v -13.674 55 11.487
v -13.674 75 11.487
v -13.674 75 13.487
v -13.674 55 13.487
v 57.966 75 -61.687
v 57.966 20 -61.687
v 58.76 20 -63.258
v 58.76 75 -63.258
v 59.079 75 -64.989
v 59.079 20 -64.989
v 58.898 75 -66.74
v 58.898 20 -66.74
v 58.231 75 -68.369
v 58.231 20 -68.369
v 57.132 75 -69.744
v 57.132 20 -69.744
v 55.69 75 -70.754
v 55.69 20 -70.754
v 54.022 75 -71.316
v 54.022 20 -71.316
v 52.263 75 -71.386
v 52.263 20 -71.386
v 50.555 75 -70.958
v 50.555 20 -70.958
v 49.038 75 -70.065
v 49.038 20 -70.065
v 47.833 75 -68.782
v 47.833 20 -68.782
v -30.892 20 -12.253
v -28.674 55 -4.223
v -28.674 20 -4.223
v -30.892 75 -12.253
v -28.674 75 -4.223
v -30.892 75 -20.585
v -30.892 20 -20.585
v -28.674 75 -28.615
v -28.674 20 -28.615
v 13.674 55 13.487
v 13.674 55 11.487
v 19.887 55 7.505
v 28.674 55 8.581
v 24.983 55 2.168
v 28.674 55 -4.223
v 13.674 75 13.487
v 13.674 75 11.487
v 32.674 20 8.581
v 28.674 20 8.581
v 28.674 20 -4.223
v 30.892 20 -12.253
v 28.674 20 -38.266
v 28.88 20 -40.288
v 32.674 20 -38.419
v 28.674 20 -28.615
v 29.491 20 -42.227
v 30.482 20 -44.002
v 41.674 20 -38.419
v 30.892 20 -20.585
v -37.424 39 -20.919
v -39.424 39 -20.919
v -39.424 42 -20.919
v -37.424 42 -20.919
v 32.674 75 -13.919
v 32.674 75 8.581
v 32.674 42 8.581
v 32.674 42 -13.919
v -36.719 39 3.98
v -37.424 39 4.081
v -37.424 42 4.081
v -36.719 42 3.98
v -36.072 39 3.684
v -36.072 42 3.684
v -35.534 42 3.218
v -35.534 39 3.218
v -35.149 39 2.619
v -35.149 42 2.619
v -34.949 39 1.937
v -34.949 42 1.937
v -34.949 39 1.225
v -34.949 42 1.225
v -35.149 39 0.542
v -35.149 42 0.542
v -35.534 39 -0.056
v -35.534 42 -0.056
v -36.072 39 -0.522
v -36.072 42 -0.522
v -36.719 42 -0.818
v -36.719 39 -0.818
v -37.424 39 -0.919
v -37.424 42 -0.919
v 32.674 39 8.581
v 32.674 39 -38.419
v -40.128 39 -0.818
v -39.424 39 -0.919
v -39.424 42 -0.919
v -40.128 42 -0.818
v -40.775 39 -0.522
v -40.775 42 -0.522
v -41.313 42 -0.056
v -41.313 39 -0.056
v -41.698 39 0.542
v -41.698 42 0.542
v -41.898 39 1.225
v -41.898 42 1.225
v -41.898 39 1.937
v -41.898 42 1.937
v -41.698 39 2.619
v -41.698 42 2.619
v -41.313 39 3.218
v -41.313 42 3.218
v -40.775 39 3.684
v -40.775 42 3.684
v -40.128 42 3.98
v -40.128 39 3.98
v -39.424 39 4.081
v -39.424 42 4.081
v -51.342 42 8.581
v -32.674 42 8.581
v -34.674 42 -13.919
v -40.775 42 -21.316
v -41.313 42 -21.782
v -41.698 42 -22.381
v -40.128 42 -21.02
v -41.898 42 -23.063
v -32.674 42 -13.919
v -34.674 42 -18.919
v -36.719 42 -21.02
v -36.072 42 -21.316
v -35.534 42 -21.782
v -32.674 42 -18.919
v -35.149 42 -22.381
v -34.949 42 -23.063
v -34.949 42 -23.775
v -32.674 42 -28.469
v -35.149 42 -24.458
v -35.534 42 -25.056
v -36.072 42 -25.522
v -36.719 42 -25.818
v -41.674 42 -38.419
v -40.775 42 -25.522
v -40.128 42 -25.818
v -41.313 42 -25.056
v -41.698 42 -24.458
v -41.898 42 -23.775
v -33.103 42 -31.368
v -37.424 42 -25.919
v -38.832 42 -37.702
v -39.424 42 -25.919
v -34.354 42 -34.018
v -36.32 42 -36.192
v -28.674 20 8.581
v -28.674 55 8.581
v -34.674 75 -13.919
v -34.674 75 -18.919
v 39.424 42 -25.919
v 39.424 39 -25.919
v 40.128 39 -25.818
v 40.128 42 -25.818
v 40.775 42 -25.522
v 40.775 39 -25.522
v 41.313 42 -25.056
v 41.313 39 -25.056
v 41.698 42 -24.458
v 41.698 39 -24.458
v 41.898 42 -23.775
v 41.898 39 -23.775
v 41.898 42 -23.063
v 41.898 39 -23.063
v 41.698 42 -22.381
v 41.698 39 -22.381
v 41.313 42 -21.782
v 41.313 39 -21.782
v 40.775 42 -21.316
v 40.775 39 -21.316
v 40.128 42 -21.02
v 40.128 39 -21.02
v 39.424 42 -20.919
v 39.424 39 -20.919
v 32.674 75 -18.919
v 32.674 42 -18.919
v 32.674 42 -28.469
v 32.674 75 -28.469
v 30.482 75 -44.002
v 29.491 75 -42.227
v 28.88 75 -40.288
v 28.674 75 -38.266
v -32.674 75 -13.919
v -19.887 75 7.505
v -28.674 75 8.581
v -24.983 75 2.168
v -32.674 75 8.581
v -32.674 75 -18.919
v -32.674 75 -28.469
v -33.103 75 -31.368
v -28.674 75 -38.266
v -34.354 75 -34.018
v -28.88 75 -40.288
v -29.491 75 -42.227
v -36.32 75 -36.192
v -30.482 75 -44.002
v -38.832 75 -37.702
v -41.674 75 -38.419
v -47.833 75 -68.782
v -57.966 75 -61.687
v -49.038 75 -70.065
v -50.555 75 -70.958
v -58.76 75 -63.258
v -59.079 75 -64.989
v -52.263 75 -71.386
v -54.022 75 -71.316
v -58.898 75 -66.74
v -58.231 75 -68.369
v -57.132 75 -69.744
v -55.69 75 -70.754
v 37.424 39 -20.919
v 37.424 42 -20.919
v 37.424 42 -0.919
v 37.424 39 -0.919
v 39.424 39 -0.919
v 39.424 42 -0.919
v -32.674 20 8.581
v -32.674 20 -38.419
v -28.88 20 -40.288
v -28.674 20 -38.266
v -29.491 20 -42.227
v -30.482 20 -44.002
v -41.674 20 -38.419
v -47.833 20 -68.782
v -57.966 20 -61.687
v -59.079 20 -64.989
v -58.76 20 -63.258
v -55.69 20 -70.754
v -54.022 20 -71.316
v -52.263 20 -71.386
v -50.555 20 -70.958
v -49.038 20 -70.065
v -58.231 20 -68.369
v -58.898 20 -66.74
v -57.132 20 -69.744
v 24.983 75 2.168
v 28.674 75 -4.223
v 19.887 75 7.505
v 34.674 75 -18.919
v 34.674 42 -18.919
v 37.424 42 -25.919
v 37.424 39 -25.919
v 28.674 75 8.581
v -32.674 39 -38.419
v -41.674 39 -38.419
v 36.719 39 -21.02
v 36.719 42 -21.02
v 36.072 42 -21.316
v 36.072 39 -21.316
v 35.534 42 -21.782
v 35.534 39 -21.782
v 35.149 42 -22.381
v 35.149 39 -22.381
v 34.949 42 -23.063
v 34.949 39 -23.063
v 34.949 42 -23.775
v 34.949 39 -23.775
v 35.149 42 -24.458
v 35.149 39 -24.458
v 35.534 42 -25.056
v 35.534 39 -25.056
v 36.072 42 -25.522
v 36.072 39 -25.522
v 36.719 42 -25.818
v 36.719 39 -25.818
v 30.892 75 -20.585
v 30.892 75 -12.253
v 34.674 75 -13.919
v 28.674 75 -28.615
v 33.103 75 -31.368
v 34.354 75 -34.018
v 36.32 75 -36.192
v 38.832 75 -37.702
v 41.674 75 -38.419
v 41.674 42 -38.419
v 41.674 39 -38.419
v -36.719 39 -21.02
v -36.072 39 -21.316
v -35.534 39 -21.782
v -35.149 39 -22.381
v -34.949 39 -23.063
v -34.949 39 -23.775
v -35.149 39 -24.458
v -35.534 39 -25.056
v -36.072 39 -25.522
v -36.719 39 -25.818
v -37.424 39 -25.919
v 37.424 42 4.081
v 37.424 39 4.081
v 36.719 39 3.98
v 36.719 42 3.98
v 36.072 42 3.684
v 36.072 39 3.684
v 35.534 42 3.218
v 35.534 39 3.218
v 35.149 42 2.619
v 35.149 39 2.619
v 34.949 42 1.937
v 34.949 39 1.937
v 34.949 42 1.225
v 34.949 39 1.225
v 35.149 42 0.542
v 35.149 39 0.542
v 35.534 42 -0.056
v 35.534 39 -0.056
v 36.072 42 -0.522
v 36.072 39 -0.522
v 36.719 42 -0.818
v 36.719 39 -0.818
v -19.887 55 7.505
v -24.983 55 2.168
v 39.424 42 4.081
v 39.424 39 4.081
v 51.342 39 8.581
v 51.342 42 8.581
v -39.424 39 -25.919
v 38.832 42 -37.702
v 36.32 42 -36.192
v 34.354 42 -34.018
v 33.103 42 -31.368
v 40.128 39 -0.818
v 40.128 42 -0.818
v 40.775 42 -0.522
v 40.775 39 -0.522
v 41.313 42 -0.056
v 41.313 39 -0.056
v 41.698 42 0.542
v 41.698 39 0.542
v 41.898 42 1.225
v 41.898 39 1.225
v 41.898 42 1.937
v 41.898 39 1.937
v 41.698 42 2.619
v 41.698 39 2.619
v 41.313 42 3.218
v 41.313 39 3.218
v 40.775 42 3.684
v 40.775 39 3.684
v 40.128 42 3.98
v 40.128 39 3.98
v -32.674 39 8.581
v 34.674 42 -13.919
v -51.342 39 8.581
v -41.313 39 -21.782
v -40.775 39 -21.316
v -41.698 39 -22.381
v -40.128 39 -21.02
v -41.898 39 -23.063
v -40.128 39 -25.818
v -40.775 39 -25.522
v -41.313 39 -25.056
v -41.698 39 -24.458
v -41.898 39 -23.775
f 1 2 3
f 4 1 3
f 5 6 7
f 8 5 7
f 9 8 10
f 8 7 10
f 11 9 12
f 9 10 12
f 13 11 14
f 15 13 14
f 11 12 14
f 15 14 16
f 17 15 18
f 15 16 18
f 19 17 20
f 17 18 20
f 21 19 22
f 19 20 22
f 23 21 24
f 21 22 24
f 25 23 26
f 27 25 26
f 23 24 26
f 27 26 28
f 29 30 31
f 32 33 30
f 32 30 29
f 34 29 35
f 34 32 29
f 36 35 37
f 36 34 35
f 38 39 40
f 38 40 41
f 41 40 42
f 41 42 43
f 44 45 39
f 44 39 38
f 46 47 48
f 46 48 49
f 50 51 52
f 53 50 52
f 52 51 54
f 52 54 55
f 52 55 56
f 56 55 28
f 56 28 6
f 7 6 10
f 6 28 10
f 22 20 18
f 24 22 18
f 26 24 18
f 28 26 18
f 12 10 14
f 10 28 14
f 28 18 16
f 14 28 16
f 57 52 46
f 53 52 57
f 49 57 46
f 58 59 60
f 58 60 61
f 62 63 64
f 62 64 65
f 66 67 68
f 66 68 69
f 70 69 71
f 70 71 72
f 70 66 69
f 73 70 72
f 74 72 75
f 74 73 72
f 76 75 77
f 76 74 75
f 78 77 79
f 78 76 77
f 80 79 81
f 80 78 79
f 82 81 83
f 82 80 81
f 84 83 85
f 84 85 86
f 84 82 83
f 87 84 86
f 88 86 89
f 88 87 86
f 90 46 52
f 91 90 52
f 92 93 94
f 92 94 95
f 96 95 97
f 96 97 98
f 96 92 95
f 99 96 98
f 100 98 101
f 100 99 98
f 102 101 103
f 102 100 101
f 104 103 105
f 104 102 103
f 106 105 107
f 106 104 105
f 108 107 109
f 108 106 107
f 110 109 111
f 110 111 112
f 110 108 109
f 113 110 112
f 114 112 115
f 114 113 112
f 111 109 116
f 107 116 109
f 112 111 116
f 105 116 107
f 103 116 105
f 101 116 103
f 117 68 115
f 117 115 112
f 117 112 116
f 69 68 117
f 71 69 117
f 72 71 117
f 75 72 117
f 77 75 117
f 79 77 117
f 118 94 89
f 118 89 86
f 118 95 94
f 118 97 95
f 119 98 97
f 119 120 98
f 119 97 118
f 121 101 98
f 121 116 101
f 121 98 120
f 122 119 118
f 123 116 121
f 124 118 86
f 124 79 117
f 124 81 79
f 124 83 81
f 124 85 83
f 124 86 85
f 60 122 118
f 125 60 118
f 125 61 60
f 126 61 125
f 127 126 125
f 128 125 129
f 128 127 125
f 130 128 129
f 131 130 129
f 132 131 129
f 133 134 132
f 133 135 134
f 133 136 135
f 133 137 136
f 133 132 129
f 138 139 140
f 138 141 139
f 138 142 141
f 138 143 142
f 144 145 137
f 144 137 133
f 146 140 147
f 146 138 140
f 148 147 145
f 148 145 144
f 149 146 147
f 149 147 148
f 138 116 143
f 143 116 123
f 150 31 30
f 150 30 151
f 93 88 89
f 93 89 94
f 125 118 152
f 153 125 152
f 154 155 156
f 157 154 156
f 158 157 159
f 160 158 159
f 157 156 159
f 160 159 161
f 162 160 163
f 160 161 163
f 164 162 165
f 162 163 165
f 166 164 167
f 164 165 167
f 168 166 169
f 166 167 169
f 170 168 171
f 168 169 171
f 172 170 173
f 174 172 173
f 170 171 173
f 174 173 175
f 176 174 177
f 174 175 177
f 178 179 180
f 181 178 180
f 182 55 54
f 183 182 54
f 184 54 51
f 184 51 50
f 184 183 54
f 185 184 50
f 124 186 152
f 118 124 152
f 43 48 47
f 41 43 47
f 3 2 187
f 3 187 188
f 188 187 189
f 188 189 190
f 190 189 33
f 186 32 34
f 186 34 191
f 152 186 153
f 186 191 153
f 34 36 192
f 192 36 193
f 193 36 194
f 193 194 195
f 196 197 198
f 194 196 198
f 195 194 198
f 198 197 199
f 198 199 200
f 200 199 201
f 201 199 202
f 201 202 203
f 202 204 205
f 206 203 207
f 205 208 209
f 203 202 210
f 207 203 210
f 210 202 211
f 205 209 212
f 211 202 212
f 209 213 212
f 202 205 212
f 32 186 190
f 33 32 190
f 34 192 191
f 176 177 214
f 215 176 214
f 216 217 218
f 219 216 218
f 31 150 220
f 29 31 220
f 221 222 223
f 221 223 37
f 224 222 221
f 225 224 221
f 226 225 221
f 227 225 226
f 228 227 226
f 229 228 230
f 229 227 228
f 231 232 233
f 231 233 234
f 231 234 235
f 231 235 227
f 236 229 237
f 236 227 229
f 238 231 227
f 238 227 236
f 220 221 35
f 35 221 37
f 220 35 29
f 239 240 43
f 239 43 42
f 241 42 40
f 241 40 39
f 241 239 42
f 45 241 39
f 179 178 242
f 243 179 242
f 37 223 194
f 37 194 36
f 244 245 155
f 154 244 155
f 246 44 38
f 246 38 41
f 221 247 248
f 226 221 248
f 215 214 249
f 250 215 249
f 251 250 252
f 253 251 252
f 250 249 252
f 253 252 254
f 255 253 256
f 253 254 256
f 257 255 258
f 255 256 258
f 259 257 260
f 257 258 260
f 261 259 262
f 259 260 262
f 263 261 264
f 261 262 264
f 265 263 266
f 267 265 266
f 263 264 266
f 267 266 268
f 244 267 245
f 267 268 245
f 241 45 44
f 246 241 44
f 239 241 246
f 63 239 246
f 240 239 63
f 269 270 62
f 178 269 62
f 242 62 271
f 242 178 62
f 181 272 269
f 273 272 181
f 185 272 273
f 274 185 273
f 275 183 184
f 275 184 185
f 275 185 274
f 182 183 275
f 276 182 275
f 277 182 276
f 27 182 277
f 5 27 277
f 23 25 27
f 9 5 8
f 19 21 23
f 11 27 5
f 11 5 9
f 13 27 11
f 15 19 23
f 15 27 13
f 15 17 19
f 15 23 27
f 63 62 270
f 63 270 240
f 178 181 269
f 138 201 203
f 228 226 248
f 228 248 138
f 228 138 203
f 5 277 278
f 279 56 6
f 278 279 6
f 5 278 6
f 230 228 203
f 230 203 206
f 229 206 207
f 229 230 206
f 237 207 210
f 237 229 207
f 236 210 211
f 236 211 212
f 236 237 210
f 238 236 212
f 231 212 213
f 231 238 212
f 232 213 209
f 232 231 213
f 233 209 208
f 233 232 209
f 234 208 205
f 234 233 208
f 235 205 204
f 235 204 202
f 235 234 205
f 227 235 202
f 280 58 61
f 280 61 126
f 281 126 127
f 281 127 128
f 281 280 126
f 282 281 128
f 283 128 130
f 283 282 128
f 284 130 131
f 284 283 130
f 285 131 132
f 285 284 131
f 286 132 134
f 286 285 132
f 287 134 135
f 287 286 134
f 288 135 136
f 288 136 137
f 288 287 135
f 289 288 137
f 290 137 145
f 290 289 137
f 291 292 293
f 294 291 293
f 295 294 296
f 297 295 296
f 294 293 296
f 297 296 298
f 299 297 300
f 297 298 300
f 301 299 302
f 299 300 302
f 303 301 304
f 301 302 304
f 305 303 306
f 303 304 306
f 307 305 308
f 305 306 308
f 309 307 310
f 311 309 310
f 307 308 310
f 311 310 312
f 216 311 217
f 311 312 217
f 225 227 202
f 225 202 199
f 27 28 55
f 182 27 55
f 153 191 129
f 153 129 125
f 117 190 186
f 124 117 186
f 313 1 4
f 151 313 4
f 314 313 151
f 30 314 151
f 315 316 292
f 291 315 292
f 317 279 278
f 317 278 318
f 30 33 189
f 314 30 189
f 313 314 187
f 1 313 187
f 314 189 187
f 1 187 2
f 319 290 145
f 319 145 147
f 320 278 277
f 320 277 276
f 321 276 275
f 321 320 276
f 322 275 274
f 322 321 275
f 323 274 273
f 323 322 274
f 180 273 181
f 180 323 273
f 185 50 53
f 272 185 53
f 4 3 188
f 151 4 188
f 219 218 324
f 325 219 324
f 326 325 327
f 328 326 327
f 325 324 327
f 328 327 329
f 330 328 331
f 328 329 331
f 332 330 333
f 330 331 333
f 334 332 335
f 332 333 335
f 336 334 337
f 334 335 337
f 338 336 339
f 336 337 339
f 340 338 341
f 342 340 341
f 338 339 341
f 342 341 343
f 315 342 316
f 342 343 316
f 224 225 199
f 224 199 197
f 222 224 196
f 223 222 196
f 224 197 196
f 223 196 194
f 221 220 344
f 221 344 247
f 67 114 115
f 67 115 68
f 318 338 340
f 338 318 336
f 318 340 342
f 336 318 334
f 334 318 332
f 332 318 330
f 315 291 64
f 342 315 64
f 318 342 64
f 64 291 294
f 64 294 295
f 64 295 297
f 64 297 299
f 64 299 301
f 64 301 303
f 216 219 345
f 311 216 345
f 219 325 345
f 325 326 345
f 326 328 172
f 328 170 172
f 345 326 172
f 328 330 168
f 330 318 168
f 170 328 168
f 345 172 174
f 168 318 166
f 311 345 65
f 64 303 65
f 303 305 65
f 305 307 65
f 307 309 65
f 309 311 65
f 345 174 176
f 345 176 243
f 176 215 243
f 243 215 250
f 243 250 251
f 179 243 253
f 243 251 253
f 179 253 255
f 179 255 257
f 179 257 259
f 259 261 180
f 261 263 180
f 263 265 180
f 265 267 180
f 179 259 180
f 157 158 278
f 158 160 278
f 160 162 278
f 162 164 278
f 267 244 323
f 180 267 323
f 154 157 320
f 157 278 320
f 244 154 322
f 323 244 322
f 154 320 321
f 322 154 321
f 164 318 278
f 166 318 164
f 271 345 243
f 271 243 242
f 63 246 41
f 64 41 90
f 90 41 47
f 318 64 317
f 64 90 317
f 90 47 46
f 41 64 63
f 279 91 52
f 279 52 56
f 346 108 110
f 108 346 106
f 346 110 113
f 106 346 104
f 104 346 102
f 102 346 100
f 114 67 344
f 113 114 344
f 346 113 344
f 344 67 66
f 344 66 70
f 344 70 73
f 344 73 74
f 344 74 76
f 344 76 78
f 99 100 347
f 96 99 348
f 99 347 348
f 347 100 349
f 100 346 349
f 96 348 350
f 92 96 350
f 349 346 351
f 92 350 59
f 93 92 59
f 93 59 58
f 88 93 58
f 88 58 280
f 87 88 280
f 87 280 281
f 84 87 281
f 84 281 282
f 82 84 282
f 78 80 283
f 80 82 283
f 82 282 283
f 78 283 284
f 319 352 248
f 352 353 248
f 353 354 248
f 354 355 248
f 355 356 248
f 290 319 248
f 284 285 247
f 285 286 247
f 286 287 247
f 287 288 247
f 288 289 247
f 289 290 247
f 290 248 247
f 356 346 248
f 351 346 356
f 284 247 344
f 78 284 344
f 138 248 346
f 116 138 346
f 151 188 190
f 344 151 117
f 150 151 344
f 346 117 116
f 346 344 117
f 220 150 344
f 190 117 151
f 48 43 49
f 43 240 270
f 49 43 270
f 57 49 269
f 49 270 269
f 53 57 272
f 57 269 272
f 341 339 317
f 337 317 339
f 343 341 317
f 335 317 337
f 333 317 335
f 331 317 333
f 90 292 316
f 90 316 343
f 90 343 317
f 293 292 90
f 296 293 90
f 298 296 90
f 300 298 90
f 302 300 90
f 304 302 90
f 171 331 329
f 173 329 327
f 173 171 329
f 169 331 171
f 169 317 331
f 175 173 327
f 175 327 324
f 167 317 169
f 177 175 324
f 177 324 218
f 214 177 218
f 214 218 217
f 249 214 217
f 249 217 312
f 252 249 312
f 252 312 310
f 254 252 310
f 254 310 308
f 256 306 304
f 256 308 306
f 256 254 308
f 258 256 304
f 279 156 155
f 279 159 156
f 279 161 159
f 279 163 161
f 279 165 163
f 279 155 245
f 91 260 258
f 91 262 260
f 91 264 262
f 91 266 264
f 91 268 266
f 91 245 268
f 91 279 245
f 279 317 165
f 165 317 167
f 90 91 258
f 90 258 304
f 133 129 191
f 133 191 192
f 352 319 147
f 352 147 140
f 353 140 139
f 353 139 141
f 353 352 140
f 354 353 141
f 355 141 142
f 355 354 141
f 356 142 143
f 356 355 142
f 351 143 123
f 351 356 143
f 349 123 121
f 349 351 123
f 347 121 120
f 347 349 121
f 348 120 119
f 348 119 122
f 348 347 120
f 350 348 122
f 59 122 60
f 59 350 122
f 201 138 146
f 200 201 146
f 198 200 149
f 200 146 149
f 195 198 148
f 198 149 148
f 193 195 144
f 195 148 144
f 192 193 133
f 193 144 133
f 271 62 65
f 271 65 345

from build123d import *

# Parameters (mm, degrees)
BOSS_EXTRU_1_DEPTH      = 55
CONG_1_R                = 10
ESQUISSE2_R             = 31
ENL_V_MAT_EXTRU_1_DEPTH = 108.780485936
BOSS_EXTRU_2_DEPTH      = 3
ESQUISSE4_W             = 2
ESQUISSE4_H             = 33
BOSS_EXTRU_3_DEPTH      = 2.5
CONG_2_R                = 10
BOSS_EXTRU_4_DEPTH      = 20


with BuildPart() as part:
    # Esquisse1 → Boss.-Extru.1 (new body)
    with BuildSketch(Plane(origin=(0, 20, 0), x_dir=(1, 0, 0), z_dir=(0, 1, 0))):
        with BuildLine():
            Line((32.673562069, -8.580941108), (32.673562069, 38.419058892))
            Line((32.673562069, 38.419058892), (41.673562069, 38.419058892))
            Line((41.673562069, 38.419058892), (57.965753801, 61.686720039))
            ThreePointArc((57.965753801, 61.686720039), (56.44690478, 70.300540881), (47.833083938, 68.781691859))
            Line((47.833083938, 68.781691859), (28.673562069, 41.419058892))
            Line((28.673562069, 41.419058892), (28.673562069, -8.580941108))
            Line((28.673562069, -8.580941108), (32.673562069, -8.580941108))
        make_face()
    extrude(amount=BOSS_EXTRU_1_DEPTH)

    # Congé1
    cong_1_edges = [part.edges().sort_by_distance(p)[0] for p in [
        (28.673562069, 47.5, -41.419058892),
    ]]
    fillet(cong_1_edges, radius=CONG_1_R)

    # Esquisse2 → Enlèv. mat.-Extru.1 (cut, through all)
    with BuildSketch(Plane(origin=(0, 75, 0), x_dir=(1, 0, 0), z_dir=(0, 1, 0))):
        with Locations((0.173562069, 16.419058892)):
            Circle(ESQUISSE2_R)
    extrude(amount=-ENL_V_MAT_EXTRU_1_DEPTH, mode=Mode.SUBTRACT)

    # Esquisse3 → Boss.-Extru.2 (add)
    with BuildSketch(Plane(origin=(0, 39, 0), x_dir=(1, 0, 0), z_dir=(0, 1, 0))):
        Polygon((32.673562069, -8.580941108), (32.673562069, 38.419058892), (41.673562069, 38.419058892), (51.341622453, -8.580941108), align=None)
        with BuildLine():
            Line((37.423562069, 25.919058892), (39.423562069, 25.919058892))
            ThreePointArc((39.423562069, 25.919058892), (41.923562069, 23.419058892), (39.423562069, 20.919058892))
            Line((39.423562069, 20.919058892), (37.423562069, 20.919058892))
            ThreePointArc((37.423562069, 20.919058892), (34.923562069, 23.419058892), (37.423562069, 25.919058892))
        make_face(mode=Mode.SUBTRACT)
        with BuildLine():
            Line((37.423562069, 0.919058892), (39.423562069, 0.919058892))
            ThreePointArc((39.423562069, 0.919058892), (41.923562069, -1.580941108), (39.423562069, -4.080941108))
            Line((39.423562069, -4.080941108), (37.423562069, -4.080941108))
            ThreePointArc((37.423562069, -4.080941108), (34.923562069, -1.580941108), (37.423562069, 0.919058892))
        make_face(mode=Mode.SUBTRACT)
    extrude(amount=BOSS_EXTRU_2_DEPTH)

    # Esquisse4 → Boss.-Extru.3 (add, symmetric)
    with BuildSketch(Plane.XY.offset(-16.419058892)):
        with Locations((33.673562069, 58.5)):
            Rectangle(ESQUISSE4_W, ESQUISSE4_H)
    extrude(amount=BOSS_EXTRU_3_DEPTH, both=True)

    # Congé2
    # the kernel refuses this fillet: 10 mm, written as the material it adds along each edge
    with BuildSketch(Plane(origin=(32.673562069, 17.125314072, -38.419058892), x_dir=(0, 0, 1), z_dir=(0, 1, 0))) as cong_2_piece_1_section:
        with BuildLine():
            CenterArc((9.949874371, 10), CONG_2_R, 185.739170477, 84.260829523)
            Line((0, 9), (0, 0))
            Line((0, 0), (9.949874371, 0))
        make_face()
    cong_2_piece_1 = extrude(amount=57.874685928, mode=Mode.PRIVATE)
    cong_2_piece_1 = split(cong_2_piece_1, bisect_by=Plane(origin=(35.242531185, 39, -35.190804861), z_dir=(0, 1, 0)), keep=Keep.TOP, mode=Mode.PRIVATE)
    add(cong_2_piece_1)

    # Esquisse5 → Boss.-Extru.4 (add)
    with BuildSketch(Plane(origin=(0, 75, 0), x_dir=(1, 0, 0), z_dir=(0, 1, 0))):
        with BuildLine():
            Line((13.673562069, -11.487033633), (13.673562069, -13.487033633))
            Line((13.673562069, -13.487033633), (28.673562069, -8.580941108))
            Line((28.673562069, -8.580941108), (32.673562069, -8.580941108))
            Line((32.673562069, -8.580941108), (32.673562069, 4.222747974))
            Line((32.673562069, 4.222747974), (28.673562069, 4.222747974))
            ThreePointArc((28.673562069, 4.222747974), (22.594518997, -4.988899686), (13.673562069, -11.487033633))
        make_face()
    extrude(amount=-BOSS_EXTRU_4_DEPTH)


with BuildPart() as body_2:
    # Symétrie1: mirrored copy
    add(part.part.mirror(Plane(origin=(0, 0, 0), x_dir=(0, 0, 1), z_dir=(1, 0, 0))))


solid = Compound([part.part, body_2.part])
